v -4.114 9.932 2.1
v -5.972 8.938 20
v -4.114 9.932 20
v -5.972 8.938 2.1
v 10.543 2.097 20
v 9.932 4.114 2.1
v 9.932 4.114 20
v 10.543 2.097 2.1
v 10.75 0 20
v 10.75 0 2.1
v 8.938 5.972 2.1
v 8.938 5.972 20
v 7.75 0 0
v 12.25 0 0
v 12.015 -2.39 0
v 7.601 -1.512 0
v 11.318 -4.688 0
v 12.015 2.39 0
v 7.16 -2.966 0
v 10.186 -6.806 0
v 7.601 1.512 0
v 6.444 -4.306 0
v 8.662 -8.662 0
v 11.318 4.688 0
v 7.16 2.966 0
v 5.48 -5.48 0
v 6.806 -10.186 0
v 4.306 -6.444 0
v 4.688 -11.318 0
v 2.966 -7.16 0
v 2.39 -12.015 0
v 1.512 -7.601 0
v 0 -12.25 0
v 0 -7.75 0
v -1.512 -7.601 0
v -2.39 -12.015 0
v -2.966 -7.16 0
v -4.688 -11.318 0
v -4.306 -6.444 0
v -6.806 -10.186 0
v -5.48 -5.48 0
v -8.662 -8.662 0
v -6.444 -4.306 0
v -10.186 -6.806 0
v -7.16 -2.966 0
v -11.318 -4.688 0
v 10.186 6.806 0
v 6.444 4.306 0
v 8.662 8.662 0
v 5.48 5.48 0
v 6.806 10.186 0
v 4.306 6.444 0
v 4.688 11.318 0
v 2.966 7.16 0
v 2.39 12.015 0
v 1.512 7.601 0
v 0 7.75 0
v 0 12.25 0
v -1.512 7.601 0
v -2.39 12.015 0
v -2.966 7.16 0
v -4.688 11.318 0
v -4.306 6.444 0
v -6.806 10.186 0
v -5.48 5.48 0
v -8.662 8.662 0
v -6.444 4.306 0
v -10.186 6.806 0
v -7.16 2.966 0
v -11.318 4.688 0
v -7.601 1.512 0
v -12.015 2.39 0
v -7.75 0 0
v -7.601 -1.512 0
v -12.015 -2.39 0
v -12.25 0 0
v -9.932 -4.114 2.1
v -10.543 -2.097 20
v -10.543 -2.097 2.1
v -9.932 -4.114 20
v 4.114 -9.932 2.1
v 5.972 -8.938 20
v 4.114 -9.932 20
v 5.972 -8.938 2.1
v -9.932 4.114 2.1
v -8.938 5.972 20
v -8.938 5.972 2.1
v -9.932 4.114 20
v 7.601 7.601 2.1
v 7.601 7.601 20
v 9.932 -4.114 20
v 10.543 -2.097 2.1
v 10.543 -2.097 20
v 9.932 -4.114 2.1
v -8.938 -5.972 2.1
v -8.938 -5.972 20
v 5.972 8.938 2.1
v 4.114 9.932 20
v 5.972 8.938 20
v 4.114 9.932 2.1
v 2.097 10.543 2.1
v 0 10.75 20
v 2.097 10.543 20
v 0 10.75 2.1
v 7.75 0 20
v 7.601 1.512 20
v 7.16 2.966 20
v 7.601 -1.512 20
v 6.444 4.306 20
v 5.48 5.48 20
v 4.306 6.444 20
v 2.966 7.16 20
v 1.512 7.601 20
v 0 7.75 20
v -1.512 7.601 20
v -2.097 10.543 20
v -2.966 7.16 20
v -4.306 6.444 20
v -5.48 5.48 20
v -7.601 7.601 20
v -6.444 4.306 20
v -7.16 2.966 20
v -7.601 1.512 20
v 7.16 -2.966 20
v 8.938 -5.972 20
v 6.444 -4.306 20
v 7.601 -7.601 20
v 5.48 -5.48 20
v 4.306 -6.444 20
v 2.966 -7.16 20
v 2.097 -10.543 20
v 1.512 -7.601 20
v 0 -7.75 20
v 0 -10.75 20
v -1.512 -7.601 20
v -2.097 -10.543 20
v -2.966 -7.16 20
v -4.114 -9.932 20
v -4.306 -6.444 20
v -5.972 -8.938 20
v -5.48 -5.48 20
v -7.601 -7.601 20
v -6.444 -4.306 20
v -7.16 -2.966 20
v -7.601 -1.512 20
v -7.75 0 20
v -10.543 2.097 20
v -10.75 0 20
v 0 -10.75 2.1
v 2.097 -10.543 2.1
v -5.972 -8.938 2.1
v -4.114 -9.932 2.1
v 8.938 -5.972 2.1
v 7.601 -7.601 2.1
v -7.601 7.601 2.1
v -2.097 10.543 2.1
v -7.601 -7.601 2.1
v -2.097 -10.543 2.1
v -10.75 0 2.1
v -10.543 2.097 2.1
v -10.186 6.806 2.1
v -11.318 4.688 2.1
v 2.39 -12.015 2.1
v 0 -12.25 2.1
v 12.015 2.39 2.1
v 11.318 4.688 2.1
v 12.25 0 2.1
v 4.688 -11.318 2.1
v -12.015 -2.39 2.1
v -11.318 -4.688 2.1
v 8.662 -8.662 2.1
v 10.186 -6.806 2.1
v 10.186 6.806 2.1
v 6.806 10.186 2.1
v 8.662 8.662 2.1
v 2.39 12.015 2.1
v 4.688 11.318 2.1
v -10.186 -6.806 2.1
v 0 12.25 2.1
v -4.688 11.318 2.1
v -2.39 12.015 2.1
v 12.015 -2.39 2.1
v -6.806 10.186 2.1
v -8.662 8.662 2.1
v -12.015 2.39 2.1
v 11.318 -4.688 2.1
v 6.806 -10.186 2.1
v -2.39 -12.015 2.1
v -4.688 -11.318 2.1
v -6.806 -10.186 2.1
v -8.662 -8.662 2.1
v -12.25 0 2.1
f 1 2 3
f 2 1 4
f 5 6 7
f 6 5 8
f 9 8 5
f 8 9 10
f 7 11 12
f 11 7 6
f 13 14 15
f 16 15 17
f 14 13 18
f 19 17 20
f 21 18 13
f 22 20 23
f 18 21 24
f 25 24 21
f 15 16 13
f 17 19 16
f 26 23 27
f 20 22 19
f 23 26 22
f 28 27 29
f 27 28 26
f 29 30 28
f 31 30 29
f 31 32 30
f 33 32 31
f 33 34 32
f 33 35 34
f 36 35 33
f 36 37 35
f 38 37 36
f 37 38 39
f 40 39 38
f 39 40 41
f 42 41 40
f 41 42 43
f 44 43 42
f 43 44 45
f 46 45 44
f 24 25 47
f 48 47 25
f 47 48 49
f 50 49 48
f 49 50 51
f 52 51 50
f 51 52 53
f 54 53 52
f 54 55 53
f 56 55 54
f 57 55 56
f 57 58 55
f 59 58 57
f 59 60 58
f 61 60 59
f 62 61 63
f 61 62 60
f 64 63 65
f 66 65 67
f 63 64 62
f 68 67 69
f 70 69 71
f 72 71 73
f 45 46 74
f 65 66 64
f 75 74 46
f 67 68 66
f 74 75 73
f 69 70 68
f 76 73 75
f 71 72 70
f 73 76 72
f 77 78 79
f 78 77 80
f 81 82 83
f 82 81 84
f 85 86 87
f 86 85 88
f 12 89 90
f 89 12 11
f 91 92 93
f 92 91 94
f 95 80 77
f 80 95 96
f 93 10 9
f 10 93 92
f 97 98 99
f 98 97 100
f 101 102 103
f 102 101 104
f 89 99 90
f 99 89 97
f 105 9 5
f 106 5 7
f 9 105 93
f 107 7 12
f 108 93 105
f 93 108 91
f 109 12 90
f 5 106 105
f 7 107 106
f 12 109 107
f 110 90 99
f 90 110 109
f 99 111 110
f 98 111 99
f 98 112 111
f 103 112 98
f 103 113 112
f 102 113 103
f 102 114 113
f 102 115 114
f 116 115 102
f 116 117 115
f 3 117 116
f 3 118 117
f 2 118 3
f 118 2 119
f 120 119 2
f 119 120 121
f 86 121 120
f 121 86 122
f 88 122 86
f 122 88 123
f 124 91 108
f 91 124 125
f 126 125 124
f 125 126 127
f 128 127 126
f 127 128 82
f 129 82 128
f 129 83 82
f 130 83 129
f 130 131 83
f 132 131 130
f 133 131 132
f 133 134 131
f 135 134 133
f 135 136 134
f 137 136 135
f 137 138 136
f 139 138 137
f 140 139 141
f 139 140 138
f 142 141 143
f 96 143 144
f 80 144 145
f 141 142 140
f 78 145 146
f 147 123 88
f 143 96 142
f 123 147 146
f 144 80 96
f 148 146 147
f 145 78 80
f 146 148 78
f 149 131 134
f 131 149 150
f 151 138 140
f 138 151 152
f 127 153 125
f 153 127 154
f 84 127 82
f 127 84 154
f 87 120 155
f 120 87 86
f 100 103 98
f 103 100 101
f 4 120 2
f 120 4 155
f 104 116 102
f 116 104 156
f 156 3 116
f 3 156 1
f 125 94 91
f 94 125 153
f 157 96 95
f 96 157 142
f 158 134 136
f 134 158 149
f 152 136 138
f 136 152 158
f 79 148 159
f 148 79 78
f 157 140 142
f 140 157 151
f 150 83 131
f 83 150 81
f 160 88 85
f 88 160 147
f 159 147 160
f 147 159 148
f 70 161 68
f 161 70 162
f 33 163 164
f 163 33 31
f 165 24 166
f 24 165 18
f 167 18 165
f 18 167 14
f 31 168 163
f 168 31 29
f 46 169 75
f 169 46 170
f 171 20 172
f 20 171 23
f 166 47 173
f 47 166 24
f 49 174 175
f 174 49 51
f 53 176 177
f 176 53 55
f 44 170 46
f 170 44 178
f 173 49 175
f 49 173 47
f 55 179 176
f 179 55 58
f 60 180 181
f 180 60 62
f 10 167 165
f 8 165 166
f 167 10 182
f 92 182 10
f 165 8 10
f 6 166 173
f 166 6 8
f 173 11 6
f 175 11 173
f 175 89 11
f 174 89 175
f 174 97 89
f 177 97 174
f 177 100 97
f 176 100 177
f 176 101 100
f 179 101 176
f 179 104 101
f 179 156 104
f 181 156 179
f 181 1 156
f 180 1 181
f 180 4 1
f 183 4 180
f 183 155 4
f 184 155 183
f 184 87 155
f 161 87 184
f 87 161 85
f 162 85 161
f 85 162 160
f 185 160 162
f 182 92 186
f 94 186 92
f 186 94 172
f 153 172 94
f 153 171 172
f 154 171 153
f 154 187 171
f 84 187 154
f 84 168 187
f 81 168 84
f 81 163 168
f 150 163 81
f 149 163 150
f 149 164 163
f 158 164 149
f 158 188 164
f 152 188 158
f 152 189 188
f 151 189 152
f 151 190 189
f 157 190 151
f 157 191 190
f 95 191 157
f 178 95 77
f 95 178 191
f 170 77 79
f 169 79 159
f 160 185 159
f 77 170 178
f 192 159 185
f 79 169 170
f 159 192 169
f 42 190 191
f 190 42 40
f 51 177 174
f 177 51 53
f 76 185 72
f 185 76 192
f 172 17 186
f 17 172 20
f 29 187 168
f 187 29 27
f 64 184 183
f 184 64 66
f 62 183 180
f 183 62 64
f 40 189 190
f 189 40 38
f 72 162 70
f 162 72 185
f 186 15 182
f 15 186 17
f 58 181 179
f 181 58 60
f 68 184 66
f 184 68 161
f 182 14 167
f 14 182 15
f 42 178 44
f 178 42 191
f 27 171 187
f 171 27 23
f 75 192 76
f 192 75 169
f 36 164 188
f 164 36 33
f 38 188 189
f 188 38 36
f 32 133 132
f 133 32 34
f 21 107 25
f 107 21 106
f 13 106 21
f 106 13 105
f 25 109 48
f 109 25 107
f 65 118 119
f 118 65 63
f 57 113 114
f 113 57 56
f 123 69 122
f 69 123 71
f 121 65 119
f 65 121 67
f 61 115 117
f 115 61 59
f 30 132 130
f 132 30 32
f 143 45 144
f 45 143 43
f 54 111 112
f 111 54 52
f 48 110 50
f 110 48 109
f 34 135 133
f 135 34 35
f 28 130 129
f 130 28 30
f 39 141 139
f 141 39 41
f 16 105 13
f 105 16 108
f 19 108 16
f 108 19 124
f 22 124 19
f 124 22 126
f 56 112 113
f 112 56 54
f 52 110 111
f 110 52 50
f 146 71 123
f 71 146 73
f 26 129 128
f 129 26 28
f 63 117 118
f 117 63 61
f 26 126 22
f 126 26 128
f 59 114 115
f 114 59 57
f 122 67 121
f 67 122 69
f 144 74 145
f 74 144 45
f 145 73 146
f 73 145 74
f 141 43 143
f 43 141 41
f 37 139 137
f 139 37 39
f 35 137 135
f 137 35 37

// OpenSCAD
$fn = 32;

// ----------------------------------------------------------------------
// Spacer sleeve: 21.5 / 15.5 x 20 mm
// ----------------------------------------------------------------------

// --- parameters (mm) ---
tube_d = 21.5;            // outside diameter
bore_d = 15.5;            // shaft bore
tube_l = 20;              // sleeve length
flange_d = 24.5;          // collar diameter
flange_t = 1.5;           // collar thickness

module sleeve() {
  cylinder(h = tube_l, d = tube_d);
  cylinder(h = flange_t + 0.6, d = flange_d);
}

difference() {
  sleeve();
  translate([0, 0, -1]) cylinder(h = tube_l + 2, d = bore_d);
}
